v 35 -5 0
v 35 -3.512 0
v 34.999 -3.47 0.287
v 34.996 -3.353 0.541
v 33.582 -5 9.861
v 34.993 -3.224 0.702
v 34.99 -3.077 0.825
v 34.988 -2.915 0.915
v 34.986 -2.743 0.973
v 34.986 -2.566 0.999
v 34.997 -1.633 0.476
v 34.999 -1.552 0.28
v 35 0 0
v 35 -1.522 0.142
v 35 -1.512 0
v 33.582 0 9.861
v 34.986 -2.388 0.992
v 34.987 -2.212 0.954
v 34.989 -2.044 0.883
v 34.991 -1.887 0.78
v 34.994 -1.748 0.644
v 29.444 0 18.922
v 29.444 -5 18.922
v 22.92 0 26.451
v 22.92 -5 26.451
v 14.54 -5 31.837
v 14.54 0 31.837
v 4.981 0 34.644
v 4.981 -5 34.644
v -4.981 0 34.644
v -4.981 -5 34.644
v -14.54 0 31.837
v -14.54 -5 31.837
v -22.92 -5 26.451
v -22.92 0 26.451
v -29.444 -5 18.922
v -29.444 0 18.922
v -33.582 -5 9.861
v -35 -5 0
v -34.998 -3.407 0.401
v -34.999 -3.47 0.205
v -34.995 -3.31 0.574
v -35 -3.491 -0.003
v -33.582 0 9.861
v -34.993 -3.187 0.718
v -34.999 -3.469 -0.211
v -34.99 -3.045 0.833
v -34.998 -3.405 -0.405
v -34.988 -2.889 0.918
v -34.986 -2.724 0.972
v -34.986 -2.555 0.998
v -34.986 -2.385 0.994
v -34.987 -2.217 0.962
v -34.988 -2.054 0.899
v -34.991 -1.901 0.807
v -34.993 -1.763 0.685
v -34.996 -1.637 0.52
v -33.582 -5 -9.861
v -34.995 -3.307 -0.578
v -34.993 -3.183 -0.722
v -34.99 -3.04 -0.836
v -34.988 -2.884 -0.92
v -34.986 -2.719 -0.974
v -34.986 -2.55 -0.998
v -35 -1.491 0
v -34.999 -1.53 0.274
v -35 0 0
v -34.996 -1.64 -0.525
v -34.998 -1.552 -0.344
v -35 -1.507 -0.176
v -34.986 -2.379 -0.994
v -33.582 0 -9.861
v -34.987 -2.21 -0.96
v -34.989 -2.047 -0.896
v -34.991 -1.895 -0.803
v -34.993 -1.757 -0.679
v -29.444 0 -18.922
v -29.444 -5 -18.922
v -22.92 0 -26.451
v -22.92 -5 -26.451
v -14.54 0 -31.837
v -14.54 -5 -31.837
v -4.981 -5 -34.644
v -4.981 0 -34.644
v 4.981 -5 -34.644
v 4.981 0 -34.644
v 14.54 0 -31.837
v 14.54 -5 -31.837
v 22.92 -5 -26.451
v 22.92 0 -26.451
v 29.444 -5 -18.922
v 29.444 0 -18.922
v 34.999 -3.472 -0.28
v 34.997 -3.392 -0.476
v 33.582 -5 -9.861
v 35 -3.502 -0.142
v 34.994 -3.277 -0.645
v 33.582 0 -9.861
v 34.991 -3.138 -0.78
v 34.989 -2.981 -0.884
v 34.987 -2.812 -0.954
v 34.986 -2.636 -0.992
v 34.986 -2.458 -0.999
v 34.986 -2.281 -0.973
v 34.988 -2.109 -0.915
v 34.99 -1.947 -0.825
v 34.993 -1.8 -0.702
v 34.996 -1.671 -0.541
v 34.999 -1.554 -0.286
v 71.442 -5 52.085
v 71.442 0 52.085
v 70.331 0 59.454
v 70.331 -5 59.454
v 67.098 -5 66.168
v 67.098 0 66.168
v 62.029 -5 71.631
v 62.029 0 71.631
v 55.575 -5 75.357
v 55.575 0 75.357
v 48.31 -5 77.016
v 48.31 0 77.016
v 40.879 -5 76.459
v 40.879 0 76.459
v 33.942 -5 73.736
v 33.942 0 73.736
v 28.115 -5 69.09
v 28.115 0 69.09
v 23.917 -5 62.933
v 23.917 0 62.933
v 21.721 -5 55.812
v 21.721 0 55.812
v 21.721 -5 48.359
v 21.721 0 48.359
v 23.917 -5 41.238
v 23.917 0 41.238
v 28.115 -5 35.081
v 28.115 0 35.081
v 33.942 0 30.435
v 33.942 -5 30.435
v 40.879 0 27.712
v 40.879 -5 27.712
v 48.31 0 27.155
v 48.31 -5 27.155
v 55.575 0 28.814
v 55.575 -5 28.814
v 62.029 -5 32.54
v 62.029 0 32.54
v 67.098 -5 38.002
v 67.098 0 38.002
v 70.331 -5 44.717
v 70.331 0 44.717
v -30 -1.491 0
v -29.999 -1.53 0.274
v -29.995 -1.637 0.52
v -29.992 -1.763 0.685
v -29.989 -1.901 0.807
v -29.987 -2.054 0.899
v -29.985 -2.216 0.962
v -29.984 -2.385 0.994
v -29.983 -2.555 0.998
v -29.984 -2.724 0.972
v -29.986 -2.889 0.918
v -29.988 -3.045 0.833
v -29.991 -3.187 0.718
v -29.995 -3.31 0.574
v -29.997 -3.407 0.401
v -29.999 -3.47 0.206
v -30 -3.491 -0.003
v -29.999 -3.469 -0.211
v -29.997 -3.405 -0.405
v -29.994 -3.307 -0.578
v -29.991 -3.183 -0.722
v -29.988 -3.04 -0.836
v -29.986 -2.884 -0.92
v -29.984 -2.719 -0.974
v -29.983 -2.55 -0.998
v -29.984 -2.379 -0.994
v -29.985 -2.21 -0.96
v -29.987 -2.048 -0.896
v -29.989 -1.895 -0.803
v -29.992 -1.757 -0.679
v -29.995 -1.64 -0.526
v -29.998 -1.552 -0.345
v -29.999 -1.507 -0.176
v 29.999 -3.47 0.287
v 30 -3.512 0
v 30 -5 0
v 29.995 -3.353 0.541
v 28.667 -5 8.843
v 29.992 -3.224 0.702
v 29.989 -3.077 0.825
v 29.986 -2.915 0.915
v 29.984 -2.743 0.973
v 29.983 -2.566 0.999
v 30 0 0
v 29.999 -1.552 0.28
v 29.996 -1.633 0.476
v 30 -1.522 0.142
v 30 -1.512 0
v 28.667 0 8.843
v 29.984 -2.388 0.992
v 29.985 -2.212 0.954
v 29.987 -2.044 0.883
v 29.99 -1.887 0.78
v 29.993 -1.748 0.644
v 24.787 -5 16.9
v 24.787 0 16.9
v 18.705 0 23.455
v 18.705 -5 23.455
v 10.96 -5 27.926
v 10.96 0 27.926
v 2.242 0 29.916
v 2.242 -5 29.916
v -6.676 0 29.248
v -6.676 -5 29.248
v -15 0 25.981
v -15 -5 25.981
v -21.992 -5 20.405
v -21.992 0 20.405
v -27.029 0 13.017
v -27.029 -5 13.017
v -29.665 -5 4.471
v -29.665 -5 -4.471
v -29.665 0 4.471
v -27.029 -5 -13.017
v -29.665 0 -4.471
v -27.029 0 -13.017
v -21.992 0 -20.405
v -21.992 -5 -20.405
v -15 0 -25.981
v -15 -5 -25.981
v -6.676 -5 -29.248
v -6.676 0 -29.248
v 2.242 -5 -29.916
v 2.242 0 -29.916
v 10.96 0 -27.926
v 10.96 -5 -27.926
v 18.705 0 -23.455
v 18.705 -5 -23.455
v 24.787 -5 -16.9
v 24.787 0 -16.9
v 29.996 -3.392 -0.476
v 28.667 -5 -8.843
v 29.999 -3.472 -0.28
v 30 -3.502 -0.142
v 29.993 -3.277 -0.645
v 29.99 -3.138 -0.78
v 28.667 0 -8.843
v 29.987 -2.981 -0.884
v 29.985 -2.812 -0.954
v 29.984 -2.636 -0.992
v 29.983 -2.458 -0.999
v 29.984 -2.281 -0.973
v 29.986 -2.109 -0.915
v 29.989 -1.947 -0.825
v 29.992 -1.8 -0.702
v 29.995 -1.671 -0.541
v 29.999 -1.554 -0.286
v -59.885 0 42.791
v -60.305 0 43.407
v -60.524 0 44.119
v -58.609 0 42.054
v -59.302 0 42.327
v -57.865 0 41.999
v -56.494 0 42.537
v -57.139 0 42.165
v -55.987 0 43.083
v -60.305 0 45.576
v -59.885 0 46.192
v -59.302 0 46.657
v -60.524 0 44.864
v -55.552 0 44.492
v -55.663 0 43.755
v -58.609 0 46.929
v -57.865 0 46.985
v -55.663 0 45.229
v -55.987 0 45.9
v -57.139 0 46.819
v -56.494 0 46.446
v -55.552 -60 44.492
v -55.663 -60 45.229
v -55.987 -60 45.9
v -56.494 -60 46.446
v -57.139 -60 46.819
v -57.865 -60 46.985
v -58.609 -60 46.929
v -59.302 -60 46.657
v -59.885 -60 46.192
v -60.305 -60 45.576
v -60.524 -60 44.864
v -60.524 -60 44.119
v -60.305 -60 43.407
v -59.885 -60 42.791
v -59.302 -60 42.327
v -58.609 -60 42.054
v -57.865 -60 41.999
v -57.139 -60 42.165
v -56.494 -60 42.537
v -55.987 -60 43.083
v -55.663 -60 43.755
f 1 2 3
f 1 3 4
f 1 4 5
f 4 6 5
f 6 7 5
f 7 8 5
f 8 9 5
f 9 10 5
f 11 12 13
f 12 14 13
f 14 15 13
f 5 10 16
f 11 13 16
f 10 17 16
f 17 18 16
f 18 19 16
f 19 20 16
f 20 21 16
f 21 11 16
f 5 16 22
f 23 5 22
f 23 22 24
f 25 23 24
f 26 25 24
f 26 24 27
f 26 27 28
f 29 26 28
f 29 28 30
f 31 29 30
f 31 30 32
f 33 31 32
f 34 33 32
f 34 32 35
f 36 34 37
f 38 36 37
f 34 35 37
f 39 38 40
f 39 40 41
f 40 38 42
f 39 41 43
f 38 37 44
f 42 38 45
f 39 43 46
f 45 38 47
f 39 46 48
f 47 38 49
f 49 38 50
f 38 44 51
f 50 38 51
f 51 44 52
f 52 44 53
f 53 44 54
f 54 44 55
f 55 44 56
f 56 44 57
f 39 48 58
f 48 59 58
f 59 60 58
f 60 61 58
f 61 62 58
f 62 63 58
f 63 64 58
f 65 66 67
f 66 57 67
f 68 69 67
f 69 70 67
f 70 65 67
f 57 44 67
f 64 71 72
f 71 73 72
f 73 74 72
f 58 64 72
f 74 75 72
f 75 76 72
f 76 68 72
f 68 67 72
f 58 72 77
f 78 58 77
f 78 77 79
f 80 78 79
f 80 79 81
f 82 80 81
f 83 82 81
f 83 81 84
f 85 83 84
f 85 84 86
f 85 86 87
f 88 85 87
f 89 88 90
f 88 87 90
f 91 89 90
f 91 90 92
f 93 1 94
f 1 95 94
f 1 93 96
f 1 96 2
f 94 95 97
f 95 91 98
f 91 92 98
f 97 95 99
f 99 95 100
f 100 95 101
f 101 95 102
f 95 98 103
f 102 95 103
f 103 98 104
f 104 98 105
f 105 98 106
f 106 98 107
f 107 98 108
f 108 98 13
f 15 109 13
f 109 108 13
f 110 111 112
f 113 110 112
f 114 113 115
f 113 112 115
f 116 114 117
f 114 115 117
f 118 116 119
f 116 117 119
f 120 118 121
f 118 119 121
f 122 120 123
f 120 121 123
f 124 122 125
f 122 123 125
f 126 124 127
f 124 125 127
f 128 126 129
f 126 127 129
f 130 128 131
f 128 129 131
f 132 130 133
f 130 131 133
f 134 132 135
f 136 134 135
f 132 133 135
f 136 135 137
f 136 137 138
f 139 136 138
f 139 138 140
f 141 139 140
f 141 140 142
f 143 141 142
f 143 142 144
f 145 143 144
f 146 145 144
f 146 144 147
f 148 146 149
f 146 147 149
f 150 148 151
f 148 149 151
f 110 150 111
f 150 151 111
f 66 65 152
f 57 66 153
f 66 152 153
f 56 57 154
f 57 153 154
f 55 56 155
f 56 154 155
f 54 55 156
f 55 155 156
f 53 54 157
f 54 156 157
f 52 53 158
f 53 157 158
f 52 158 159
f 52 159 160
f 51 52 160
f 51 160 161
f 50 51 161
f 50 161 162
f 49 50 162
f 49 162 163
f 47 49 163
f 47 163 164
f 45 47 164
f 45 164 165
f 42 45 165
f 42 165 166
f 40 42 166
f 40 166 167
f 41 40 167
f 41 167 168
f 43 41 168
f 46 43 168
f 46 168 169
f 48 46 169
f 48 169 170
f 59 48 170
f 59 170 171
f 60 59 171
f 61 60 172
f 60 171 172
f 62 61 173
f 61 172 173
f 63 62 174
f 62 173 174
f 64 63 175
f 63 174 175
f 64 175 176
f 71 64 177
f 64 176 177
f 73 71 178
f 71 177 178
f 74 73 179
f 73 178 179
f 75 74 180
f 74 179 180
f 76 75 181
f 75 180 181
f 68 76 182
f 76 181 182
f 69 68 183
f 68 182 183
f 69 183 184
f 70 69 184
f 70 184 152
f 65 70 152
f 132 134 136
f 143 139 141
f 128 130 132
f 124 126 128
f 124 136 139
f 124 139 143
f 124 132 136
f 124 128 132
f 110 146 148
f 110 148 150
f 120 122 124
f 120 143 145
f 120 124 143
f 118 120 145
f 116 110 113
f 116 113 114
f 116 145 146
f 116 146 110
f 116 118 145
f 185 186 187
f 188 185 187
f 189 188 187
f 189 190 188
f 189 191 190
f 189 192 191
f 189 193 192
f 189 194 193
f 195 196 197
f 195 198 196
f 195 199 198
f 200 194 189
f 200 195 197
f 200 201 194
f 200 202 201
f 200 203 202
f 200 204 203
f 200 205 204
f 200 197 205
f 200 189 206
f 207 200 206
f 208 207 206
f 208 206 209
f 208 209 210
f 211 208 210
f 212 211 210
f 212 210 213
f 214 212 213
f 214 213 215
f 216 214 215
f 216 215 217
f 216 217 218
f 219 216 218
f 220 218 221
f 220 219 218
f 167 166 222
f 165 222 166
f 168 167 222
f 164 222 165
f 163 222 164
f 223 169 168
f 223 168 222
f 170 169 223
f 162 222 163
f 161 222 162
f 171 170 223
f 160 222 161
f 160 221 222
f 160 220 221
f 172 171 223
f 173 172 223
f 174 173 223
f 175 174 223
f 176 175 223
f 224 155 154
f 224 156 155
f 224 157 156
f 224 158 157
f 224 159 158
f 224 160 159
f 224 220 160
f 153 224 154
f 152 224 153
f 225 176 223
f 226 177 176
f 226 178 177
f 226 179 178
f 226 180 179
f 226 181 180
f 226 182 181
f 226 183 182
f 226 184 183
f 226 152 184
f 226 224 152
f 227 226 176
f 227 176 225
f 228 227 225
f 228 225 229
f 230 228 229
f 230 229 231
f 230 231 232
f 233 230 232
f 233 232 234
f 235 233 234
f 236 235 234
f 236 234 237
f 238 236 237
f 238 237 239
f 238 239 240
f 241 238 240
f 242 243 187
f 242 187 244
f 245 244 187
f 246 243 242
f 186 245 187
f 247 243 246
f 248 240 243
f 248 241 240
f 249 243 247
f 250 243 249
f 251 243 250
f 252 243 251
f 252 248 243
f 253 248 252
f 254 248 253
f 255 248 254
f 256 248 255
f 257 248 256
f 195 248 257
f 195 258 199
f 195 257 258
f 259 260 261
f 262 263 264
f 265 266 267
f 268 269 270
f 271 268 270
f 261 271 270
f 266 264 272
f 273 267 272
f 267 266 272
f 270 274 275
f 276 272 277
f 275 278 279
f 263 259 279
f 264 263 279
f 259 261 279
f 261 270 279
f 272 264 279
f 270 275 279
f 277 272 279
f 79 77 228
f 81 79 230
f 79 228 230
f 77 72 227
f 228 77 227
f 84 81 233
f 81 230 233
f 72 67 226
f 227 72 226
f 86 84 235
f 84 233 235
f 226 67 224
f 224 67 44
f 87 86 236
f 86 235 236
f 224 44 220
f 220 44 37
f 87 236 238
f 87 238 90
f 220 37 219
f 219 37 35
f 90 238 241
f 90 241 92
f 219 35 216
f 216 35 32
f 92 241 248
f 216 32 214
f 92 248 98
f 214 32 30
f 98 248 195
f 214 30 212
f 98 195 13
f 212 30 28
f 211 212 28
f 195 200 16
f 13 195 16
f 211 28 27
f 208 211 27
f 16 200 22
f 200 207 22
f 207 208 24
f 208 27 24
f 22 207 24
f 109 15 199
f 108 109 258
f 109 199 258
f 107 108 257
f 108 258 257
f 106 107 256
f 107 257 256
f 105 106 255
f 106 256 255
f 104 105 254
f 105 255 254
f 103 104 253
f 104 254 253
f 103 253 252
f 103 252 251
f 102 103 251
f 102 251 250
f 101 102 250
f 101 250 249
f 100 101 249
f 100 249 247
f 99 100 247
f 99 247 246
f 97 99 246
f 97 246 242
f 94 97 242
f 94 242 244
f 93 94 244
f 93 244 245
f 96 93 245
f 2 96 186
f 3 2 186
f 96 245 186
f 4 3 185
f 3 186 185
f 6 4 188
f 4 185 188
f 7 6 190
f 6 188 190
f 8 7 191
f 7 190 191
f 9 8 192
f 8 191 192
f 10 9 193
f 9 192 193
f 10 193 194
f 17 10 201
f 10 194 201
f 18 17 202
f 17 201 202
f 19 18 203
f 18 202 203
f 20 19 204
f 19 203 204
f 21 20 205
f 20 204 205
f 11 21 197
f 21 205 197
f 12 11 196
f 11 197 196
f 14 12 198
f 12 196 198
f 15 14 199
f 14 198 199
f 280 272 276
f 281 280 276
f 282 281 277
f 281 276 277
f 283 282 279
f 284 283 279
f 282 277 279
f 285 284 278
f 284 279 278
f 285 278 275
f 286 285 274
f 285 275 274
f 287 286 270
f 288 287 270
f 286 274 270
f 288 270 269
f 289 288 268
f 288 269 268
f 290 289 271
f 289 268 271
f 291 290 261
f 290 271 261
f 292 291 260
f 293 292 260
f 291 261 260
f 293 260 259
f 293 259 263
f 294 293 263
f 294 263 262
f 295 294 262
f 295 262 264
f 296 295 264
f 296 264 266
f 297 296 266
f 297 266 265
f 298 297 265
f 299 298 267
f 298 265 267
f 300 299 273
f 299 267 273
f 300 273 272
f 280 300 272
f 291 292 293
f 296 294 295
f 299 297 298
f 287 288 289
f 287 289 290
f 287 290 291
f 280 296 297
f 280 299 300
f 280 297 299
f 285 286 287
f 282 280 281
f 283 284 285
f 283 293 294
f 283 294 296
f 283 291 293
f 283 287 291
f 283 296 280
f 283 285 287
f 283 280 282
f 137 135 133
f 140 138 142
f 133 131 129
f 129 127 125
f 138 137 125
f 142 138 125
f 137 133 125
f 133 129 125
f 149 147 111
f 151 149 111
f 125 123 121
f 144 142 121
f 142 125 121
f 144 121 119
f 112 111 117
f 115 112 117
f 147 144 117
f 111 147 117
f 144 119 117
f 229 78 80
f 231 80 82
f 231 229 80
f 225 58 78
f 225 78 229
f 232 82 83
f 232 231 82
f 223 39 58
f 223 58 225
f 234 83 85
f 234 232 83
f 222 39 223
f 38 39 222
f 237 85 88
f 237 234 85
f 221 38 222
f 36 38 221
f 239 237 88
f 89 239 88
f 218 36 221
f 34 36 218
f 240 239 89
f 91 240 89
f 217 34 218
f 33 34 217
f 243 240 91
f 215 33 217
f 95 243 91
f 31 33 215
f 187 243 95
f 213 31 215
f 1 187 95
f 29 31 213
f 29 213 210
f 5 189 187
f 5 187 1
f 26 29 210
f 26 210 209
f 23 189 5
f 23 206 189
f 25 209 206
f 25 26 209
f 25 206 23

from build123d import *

# Parameters (mm, degrees)
F0_R     = 35
F0_R_2   = 30
F1_DEPTH = 5
F3_D     = 2
F3_DEPTH = 45
F3_TIP   = 0.600860619
F5_D     = 2
F5_DEPTH = 100
F5_TIP   = 0.600860619
F6_R     = 25
F7_DEPTH = 5
F8_R     = 2.5
F9_DEPTH = 60


with BuildPart() as f1:
    # F0 (on Front) → F1 (new body)
    with BuildSketch(Plane.XZ):
        Circle(F0_R)
        Circle(F0_R_2, mode=Mode.SUBTRACT)
    extrude(amount=F1_DEPTH)

    # F3 (one way)
    with BuildSketch(Plane.YZ):
        with Locations((-2.4911221117, 0)):
            Circle(F3_D / 2)
    extrude(amount=-F3_DEPTH, mode=Mode.SUBTRACT)
    with Locations(Plane.YZ):
        with Locations((-2.4911221117, 0)):
            with Locations((0, 0, -(F3_DEPTH + F3_TIP / 2))):  # 118° drill point
                Cone(0, F3_D / 2, F3_TIP, mode=Mode.SUBTRACT)

    # F5 (one way)
    with BuildSketch(Plane(origin=(0, 0, 0), x_dir=(0, 1, 0), z_dir=(-1, 0, 0))):
        with Locations((-2.5122950319, 0)):
            Circle(F5_D / 2)
    extrude(amount=-F5_DEPTH, mode=Mode.SUBTRACT)
    with Locations(Plane(origin=(0, 0, 0), x_dir=(0, 1, 0), z_dir=(-1, 0, 0))):
        with Locations((-2.5122950319, 0)):
            with Locations((0, 0, -(F5_DEPTH + F5_TIP / 2))):  # 118° drill point
                Cone(0, F5_D / 2, F5_TIP, mode=Mode.SUBTRACT)


with BuildPart() as f7:
    # F6 (on Front) → F7 (new body)
    with BuildSketch(Plane.XZ):
        with Locations((46.4415626587, 52.0854784032)):
            Circle(F6_R)
    extrude(amount=F7_DEPTH)


with BuildPart() as f9:
    # F8 (on Front) → F9 (new body)
    with BuildSketch(Plane.XZ):
        with Locations((-58.0522492528, 44.4917827845)):
            Circle(F8_R)
    extrude(amount=F9_DEPTH)


solid = Compound([f1.part, f7.part, f9.part])
